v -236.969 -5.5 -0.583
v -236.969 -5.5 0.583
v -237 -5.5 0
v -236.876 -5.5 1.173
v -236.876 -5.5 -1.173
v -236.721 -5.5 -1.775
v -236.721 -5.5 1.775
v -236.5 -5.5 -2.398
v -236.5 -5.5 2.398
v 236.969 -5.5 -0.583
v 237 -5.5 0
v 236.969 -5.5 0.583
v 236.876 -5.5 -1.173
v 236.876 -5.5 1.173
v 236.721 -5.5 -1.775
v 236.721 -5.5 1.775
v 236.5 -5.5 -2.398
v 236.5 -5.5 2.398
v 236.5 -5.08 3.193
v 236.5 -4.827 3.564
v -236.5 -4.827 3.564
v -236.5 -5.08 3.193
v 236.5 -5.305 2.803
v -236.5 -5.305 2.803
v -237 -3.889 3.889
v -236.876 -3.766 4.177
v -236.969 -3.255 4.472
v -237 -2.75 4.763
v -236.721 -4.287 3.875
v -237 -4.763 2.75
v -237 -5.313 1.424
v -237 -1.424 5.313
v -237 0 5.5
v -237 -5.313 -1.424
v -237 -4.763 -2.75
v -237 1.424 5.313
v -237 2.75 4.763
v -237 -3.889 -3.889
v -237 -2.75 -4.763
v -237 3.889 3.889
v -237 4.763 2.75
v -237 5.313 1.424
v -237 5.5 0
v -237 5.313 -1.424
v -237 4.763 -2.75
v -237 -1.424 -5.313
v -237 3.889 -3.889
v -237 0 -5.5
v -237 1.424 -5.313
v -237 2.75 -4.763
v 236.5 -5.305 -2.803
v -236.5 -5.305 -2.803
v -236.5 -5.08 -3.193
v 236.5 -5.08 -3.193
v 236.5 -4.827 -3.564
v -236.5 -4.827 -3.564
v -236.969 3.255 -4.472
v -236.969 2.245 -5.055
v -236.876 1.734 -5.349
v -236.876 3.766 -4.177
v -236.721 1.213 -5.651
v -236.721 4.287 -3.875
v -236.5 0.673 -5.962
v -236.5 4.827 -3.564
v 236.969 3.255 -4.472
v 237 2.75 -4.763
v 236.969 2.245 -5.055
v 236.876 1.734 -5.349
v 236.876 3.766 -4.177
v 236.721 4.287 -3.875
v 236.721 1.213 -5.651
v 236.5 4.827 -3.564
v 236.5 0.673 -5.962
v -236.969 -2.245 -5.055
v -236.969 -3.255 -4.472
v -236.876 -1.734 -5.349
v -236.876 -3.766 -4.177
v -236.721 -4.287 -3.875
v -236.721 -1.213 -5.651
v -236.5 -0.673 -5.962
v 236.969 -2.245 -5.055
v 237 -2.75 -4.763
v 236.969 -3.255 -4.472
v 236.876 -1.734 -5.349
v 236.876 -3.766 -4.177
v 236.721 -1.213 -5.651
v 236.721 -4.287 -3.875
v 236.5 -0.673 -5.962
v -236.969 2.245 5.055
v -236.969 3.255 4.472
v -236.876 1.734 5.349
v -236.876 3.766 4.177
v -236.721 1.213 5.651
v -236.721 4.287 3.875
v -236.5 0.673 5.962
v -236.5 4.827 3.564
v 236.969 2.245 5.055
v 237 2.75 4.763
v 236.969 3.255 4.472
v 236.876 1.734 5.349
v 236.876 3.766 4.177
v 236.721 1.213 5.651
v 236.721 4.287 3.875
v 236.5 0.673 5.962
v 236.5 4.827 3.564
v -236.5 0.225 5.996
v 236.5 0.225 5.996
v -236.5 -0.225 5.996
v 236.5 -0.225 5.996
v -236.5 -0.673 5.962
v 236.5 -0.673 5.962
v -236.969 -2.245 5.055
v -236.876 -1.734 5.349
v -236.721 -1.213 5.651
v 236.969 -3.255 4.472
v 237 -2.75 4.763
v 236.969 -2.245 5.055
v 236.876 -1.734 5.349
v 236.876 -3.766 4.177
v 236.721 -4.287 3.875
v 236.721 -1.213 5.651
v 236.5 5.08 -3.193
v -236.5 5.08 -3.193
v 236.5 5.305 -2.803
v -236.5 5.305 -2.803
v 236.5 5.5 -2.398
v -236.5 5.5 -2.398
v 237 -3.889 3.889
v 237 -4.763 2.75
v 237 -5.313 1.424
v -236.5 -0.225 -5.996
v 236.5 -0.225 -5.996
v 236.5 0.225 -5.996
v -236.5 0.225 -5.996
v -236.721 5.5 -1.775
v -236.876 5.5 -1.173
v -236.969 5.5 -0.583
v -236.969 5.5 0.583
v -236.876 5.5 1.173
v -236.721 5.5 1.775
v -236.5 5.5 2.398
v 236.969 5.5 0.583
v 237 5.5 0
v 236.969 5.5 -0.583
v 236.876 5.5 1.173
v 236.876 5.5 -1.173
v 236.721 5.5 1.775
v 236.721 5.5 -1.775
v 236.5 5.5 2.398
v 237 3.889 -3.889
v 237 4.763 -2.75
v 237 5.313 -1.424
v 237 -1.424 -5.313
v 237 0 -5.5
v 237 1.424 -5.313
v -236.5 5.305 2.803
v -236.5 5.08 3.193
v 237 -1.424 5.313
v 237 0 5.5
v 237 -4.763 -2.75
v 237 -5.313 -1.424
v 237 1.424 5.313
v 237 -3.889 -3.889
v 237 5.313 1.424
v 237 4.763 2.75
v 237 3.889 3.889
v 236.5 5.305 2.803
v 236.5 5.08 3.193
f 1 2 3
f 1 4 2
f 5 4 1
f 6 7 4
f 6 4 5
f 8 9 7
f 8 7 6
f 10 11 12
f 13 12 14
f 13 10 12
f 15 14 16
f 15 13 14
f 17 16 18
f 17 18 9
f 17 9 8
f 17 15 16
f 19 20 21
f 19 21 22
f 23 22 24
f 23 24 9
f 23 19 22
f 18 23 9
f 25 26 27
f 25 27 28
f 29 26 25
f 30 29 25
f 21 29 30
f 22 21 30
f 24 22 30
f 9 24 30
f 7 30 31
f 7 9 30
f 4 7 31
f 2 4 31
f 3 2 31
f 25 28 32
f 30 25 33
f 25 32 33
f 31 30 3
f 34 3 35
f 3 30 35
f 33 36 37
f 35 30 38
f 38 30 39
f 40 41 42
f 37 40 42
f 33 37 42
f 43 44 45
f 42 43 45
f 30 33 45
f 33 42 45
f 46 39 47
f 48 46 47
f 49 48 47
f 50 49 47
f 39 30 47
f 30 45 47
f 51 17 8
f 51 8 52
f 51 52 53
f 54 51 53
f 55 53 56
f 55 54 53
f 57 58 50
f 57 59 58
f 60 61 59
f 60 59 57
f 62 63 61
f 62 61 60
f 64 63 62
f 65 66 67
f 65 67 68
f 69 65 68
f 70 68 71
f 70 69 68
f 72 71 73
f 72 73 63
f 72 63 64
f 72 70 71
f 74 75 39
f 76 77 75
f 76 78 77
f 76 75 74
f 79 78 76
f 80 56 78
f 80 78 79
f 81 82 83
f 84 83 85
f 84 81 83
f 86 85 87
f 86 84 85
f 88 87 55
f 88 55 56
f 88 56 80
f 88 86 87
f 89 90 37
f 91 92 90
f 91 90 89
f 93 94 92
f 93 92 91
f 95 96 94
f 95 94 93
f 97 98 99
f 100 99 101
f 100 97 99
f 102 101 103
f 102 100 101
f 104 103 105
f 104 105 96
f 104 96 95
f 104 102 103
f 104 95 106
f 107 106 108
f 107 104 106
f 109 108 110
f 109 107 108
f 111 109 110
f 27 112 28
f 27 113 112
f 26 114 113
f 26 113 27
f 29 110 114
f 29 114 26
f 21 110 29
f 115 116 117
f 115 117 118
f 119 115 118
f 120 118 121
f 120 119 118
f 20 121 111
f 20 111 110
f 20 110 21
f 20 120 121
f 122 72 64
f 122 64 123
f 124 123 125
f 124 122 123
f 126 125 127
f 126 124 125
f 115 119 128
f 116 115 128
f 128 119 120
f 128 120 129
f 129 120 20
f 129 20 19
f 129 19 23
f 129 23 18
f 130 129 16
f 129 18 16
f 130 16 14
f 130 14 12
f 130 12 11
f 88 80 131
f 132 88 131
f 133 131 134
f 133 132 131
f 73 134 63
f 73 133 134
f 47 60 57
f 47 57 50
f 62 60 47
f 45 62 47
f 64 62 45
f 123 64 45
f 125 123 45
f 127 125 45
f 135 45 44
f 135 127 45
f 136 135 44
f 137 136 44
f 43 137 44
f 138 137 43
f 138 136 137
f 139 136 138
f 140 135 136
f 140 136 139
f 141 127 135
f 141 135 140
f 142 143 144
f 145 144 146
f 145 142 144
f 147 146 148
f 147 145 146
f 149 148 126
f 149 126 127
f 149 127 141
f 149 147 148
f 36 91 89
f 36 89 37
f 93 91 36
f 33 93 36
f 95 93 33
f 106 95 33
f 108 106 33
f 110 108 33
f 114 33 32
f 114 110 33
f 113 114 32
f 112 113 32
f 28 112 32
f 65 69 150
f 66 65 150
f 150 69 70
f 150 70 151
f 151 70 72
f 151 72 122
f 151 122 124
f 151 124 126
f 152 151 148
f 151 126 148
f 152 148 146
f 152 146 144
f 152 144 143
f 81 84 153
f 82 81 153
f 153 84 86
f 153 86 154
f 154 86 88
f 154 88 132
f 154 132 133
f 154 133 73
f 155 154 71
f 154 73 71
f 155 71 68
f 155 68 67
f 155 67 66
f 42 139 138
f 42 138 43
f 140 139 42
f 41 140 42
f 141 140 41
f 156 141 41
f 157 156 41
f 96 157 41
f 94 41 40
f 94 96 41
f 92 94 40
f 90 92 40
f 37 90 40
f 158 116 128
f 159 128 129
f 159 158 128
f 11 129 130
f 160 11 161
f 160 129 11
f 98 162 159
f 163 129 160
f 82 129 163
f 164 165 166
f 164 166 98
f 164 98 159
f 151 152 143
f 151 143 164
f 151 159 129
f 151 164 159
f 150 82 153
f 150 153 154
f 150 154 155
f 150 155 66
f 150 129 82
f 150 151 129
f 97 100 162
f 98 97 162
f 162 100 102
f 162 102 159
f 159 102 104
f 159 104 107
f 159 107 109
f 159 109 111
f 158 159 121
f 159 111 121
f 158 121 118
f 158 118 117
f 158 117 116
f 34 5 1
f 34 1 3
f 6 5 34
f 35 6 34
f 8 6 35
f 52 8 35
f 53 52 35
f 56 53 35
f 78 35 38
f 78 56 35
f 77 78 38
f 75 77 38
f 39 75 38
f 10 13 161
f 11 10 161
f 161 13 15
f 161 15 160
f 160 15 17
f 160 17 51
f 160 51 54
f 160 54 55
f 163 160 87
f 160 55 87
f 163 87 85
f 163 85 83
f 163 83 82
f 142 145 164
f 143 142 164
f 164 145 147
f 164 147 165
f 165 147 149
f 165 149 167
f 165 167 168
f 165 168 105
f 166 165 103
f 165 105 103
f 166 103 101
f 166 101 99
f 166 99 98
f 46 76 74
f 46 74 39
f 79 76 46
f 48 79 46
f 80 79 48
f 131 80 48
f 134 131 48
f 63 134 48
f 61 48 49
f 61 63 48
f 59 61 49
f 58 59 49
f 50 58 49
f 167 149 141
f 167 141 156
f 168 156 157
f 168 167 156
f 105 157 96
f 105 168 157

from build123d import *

# Parameters (mm, degrees)
BOSS_EXTRUDE1_DEPTH = 237


with BuildPart() as part:
    # Sketch1 → Boss-Extrude1 (new body)
    with BuildSketch(Plane(origin=(0, 0, 0), x_dir=(0, 0, -1), z_dir=(1, 0, 0))):
        with BuildLine():
            Line((2.397915762, 5.5), (-2.397915762, 5.5))
            ThreePointArc((-2.397915762, 5.5), (-3, 5.196152423), (-3.56418184, 4.826655966))
            Line((-3.56418184, 4.826655966), (-5.962097602, 0.673344034))
            ThreePointArc((-5.962097602, 0.673344034), (-6, 0), (-5.962097602, -0.673344034))
            Line((-5.962097602, -0.673344034), (-3.56418184, -4.826655966))
            ThreePointArc((-3.56418184, -4.826655966), (-3, -5.196152423), (-2.397915762, -5.5))
            Line((-2.397915762, -5.5), (2.397915762, -5.5))
            ThreePointArc((2.397915762, -5.5), (3, -5.196152423), (3.56418184, -4.826655966))
            Line((3.56418184, -4.826655966), (5.962097602, -0.673344034))
            ThreePointArc((5.962097602, -0.673344034), (6, 0), (5.962097602, 0.673344034))
            Line((5.962097602, 0.673344034), (3.56418184, 4.826655966))
            ThreePointArc((3.56418184, 4.826655966), (3, 5.196152423), (2.397915762, 5.5))
        make_face()
    extrude(amount=BOSS_EXTRUDE1_DEPTH)

    # Sketch3 → Cut-Revolve6 (revolve, cut)
    with BuildSketch(Plane(origin=(0, 0, 0), x_dir=(1, 0, 0), z_dir=(0, 1, 0))):
        Polygon((236.5, -6), (237, -6), (237, -5.5), align=None)
    revolve(axis=Axis((0, 0, 0), (1, 0, 0)), mode=Mode.SUBTRACT)

    # Mirror1: part across plane


with BuildPart() as part_1:
    add(part.part)
    add(part.part.mirror(Plane(origin=(0, 0, 0), x_dir=(0, 0, 1), z_dir=(1, 0, 0))))


solid = part_1.part
